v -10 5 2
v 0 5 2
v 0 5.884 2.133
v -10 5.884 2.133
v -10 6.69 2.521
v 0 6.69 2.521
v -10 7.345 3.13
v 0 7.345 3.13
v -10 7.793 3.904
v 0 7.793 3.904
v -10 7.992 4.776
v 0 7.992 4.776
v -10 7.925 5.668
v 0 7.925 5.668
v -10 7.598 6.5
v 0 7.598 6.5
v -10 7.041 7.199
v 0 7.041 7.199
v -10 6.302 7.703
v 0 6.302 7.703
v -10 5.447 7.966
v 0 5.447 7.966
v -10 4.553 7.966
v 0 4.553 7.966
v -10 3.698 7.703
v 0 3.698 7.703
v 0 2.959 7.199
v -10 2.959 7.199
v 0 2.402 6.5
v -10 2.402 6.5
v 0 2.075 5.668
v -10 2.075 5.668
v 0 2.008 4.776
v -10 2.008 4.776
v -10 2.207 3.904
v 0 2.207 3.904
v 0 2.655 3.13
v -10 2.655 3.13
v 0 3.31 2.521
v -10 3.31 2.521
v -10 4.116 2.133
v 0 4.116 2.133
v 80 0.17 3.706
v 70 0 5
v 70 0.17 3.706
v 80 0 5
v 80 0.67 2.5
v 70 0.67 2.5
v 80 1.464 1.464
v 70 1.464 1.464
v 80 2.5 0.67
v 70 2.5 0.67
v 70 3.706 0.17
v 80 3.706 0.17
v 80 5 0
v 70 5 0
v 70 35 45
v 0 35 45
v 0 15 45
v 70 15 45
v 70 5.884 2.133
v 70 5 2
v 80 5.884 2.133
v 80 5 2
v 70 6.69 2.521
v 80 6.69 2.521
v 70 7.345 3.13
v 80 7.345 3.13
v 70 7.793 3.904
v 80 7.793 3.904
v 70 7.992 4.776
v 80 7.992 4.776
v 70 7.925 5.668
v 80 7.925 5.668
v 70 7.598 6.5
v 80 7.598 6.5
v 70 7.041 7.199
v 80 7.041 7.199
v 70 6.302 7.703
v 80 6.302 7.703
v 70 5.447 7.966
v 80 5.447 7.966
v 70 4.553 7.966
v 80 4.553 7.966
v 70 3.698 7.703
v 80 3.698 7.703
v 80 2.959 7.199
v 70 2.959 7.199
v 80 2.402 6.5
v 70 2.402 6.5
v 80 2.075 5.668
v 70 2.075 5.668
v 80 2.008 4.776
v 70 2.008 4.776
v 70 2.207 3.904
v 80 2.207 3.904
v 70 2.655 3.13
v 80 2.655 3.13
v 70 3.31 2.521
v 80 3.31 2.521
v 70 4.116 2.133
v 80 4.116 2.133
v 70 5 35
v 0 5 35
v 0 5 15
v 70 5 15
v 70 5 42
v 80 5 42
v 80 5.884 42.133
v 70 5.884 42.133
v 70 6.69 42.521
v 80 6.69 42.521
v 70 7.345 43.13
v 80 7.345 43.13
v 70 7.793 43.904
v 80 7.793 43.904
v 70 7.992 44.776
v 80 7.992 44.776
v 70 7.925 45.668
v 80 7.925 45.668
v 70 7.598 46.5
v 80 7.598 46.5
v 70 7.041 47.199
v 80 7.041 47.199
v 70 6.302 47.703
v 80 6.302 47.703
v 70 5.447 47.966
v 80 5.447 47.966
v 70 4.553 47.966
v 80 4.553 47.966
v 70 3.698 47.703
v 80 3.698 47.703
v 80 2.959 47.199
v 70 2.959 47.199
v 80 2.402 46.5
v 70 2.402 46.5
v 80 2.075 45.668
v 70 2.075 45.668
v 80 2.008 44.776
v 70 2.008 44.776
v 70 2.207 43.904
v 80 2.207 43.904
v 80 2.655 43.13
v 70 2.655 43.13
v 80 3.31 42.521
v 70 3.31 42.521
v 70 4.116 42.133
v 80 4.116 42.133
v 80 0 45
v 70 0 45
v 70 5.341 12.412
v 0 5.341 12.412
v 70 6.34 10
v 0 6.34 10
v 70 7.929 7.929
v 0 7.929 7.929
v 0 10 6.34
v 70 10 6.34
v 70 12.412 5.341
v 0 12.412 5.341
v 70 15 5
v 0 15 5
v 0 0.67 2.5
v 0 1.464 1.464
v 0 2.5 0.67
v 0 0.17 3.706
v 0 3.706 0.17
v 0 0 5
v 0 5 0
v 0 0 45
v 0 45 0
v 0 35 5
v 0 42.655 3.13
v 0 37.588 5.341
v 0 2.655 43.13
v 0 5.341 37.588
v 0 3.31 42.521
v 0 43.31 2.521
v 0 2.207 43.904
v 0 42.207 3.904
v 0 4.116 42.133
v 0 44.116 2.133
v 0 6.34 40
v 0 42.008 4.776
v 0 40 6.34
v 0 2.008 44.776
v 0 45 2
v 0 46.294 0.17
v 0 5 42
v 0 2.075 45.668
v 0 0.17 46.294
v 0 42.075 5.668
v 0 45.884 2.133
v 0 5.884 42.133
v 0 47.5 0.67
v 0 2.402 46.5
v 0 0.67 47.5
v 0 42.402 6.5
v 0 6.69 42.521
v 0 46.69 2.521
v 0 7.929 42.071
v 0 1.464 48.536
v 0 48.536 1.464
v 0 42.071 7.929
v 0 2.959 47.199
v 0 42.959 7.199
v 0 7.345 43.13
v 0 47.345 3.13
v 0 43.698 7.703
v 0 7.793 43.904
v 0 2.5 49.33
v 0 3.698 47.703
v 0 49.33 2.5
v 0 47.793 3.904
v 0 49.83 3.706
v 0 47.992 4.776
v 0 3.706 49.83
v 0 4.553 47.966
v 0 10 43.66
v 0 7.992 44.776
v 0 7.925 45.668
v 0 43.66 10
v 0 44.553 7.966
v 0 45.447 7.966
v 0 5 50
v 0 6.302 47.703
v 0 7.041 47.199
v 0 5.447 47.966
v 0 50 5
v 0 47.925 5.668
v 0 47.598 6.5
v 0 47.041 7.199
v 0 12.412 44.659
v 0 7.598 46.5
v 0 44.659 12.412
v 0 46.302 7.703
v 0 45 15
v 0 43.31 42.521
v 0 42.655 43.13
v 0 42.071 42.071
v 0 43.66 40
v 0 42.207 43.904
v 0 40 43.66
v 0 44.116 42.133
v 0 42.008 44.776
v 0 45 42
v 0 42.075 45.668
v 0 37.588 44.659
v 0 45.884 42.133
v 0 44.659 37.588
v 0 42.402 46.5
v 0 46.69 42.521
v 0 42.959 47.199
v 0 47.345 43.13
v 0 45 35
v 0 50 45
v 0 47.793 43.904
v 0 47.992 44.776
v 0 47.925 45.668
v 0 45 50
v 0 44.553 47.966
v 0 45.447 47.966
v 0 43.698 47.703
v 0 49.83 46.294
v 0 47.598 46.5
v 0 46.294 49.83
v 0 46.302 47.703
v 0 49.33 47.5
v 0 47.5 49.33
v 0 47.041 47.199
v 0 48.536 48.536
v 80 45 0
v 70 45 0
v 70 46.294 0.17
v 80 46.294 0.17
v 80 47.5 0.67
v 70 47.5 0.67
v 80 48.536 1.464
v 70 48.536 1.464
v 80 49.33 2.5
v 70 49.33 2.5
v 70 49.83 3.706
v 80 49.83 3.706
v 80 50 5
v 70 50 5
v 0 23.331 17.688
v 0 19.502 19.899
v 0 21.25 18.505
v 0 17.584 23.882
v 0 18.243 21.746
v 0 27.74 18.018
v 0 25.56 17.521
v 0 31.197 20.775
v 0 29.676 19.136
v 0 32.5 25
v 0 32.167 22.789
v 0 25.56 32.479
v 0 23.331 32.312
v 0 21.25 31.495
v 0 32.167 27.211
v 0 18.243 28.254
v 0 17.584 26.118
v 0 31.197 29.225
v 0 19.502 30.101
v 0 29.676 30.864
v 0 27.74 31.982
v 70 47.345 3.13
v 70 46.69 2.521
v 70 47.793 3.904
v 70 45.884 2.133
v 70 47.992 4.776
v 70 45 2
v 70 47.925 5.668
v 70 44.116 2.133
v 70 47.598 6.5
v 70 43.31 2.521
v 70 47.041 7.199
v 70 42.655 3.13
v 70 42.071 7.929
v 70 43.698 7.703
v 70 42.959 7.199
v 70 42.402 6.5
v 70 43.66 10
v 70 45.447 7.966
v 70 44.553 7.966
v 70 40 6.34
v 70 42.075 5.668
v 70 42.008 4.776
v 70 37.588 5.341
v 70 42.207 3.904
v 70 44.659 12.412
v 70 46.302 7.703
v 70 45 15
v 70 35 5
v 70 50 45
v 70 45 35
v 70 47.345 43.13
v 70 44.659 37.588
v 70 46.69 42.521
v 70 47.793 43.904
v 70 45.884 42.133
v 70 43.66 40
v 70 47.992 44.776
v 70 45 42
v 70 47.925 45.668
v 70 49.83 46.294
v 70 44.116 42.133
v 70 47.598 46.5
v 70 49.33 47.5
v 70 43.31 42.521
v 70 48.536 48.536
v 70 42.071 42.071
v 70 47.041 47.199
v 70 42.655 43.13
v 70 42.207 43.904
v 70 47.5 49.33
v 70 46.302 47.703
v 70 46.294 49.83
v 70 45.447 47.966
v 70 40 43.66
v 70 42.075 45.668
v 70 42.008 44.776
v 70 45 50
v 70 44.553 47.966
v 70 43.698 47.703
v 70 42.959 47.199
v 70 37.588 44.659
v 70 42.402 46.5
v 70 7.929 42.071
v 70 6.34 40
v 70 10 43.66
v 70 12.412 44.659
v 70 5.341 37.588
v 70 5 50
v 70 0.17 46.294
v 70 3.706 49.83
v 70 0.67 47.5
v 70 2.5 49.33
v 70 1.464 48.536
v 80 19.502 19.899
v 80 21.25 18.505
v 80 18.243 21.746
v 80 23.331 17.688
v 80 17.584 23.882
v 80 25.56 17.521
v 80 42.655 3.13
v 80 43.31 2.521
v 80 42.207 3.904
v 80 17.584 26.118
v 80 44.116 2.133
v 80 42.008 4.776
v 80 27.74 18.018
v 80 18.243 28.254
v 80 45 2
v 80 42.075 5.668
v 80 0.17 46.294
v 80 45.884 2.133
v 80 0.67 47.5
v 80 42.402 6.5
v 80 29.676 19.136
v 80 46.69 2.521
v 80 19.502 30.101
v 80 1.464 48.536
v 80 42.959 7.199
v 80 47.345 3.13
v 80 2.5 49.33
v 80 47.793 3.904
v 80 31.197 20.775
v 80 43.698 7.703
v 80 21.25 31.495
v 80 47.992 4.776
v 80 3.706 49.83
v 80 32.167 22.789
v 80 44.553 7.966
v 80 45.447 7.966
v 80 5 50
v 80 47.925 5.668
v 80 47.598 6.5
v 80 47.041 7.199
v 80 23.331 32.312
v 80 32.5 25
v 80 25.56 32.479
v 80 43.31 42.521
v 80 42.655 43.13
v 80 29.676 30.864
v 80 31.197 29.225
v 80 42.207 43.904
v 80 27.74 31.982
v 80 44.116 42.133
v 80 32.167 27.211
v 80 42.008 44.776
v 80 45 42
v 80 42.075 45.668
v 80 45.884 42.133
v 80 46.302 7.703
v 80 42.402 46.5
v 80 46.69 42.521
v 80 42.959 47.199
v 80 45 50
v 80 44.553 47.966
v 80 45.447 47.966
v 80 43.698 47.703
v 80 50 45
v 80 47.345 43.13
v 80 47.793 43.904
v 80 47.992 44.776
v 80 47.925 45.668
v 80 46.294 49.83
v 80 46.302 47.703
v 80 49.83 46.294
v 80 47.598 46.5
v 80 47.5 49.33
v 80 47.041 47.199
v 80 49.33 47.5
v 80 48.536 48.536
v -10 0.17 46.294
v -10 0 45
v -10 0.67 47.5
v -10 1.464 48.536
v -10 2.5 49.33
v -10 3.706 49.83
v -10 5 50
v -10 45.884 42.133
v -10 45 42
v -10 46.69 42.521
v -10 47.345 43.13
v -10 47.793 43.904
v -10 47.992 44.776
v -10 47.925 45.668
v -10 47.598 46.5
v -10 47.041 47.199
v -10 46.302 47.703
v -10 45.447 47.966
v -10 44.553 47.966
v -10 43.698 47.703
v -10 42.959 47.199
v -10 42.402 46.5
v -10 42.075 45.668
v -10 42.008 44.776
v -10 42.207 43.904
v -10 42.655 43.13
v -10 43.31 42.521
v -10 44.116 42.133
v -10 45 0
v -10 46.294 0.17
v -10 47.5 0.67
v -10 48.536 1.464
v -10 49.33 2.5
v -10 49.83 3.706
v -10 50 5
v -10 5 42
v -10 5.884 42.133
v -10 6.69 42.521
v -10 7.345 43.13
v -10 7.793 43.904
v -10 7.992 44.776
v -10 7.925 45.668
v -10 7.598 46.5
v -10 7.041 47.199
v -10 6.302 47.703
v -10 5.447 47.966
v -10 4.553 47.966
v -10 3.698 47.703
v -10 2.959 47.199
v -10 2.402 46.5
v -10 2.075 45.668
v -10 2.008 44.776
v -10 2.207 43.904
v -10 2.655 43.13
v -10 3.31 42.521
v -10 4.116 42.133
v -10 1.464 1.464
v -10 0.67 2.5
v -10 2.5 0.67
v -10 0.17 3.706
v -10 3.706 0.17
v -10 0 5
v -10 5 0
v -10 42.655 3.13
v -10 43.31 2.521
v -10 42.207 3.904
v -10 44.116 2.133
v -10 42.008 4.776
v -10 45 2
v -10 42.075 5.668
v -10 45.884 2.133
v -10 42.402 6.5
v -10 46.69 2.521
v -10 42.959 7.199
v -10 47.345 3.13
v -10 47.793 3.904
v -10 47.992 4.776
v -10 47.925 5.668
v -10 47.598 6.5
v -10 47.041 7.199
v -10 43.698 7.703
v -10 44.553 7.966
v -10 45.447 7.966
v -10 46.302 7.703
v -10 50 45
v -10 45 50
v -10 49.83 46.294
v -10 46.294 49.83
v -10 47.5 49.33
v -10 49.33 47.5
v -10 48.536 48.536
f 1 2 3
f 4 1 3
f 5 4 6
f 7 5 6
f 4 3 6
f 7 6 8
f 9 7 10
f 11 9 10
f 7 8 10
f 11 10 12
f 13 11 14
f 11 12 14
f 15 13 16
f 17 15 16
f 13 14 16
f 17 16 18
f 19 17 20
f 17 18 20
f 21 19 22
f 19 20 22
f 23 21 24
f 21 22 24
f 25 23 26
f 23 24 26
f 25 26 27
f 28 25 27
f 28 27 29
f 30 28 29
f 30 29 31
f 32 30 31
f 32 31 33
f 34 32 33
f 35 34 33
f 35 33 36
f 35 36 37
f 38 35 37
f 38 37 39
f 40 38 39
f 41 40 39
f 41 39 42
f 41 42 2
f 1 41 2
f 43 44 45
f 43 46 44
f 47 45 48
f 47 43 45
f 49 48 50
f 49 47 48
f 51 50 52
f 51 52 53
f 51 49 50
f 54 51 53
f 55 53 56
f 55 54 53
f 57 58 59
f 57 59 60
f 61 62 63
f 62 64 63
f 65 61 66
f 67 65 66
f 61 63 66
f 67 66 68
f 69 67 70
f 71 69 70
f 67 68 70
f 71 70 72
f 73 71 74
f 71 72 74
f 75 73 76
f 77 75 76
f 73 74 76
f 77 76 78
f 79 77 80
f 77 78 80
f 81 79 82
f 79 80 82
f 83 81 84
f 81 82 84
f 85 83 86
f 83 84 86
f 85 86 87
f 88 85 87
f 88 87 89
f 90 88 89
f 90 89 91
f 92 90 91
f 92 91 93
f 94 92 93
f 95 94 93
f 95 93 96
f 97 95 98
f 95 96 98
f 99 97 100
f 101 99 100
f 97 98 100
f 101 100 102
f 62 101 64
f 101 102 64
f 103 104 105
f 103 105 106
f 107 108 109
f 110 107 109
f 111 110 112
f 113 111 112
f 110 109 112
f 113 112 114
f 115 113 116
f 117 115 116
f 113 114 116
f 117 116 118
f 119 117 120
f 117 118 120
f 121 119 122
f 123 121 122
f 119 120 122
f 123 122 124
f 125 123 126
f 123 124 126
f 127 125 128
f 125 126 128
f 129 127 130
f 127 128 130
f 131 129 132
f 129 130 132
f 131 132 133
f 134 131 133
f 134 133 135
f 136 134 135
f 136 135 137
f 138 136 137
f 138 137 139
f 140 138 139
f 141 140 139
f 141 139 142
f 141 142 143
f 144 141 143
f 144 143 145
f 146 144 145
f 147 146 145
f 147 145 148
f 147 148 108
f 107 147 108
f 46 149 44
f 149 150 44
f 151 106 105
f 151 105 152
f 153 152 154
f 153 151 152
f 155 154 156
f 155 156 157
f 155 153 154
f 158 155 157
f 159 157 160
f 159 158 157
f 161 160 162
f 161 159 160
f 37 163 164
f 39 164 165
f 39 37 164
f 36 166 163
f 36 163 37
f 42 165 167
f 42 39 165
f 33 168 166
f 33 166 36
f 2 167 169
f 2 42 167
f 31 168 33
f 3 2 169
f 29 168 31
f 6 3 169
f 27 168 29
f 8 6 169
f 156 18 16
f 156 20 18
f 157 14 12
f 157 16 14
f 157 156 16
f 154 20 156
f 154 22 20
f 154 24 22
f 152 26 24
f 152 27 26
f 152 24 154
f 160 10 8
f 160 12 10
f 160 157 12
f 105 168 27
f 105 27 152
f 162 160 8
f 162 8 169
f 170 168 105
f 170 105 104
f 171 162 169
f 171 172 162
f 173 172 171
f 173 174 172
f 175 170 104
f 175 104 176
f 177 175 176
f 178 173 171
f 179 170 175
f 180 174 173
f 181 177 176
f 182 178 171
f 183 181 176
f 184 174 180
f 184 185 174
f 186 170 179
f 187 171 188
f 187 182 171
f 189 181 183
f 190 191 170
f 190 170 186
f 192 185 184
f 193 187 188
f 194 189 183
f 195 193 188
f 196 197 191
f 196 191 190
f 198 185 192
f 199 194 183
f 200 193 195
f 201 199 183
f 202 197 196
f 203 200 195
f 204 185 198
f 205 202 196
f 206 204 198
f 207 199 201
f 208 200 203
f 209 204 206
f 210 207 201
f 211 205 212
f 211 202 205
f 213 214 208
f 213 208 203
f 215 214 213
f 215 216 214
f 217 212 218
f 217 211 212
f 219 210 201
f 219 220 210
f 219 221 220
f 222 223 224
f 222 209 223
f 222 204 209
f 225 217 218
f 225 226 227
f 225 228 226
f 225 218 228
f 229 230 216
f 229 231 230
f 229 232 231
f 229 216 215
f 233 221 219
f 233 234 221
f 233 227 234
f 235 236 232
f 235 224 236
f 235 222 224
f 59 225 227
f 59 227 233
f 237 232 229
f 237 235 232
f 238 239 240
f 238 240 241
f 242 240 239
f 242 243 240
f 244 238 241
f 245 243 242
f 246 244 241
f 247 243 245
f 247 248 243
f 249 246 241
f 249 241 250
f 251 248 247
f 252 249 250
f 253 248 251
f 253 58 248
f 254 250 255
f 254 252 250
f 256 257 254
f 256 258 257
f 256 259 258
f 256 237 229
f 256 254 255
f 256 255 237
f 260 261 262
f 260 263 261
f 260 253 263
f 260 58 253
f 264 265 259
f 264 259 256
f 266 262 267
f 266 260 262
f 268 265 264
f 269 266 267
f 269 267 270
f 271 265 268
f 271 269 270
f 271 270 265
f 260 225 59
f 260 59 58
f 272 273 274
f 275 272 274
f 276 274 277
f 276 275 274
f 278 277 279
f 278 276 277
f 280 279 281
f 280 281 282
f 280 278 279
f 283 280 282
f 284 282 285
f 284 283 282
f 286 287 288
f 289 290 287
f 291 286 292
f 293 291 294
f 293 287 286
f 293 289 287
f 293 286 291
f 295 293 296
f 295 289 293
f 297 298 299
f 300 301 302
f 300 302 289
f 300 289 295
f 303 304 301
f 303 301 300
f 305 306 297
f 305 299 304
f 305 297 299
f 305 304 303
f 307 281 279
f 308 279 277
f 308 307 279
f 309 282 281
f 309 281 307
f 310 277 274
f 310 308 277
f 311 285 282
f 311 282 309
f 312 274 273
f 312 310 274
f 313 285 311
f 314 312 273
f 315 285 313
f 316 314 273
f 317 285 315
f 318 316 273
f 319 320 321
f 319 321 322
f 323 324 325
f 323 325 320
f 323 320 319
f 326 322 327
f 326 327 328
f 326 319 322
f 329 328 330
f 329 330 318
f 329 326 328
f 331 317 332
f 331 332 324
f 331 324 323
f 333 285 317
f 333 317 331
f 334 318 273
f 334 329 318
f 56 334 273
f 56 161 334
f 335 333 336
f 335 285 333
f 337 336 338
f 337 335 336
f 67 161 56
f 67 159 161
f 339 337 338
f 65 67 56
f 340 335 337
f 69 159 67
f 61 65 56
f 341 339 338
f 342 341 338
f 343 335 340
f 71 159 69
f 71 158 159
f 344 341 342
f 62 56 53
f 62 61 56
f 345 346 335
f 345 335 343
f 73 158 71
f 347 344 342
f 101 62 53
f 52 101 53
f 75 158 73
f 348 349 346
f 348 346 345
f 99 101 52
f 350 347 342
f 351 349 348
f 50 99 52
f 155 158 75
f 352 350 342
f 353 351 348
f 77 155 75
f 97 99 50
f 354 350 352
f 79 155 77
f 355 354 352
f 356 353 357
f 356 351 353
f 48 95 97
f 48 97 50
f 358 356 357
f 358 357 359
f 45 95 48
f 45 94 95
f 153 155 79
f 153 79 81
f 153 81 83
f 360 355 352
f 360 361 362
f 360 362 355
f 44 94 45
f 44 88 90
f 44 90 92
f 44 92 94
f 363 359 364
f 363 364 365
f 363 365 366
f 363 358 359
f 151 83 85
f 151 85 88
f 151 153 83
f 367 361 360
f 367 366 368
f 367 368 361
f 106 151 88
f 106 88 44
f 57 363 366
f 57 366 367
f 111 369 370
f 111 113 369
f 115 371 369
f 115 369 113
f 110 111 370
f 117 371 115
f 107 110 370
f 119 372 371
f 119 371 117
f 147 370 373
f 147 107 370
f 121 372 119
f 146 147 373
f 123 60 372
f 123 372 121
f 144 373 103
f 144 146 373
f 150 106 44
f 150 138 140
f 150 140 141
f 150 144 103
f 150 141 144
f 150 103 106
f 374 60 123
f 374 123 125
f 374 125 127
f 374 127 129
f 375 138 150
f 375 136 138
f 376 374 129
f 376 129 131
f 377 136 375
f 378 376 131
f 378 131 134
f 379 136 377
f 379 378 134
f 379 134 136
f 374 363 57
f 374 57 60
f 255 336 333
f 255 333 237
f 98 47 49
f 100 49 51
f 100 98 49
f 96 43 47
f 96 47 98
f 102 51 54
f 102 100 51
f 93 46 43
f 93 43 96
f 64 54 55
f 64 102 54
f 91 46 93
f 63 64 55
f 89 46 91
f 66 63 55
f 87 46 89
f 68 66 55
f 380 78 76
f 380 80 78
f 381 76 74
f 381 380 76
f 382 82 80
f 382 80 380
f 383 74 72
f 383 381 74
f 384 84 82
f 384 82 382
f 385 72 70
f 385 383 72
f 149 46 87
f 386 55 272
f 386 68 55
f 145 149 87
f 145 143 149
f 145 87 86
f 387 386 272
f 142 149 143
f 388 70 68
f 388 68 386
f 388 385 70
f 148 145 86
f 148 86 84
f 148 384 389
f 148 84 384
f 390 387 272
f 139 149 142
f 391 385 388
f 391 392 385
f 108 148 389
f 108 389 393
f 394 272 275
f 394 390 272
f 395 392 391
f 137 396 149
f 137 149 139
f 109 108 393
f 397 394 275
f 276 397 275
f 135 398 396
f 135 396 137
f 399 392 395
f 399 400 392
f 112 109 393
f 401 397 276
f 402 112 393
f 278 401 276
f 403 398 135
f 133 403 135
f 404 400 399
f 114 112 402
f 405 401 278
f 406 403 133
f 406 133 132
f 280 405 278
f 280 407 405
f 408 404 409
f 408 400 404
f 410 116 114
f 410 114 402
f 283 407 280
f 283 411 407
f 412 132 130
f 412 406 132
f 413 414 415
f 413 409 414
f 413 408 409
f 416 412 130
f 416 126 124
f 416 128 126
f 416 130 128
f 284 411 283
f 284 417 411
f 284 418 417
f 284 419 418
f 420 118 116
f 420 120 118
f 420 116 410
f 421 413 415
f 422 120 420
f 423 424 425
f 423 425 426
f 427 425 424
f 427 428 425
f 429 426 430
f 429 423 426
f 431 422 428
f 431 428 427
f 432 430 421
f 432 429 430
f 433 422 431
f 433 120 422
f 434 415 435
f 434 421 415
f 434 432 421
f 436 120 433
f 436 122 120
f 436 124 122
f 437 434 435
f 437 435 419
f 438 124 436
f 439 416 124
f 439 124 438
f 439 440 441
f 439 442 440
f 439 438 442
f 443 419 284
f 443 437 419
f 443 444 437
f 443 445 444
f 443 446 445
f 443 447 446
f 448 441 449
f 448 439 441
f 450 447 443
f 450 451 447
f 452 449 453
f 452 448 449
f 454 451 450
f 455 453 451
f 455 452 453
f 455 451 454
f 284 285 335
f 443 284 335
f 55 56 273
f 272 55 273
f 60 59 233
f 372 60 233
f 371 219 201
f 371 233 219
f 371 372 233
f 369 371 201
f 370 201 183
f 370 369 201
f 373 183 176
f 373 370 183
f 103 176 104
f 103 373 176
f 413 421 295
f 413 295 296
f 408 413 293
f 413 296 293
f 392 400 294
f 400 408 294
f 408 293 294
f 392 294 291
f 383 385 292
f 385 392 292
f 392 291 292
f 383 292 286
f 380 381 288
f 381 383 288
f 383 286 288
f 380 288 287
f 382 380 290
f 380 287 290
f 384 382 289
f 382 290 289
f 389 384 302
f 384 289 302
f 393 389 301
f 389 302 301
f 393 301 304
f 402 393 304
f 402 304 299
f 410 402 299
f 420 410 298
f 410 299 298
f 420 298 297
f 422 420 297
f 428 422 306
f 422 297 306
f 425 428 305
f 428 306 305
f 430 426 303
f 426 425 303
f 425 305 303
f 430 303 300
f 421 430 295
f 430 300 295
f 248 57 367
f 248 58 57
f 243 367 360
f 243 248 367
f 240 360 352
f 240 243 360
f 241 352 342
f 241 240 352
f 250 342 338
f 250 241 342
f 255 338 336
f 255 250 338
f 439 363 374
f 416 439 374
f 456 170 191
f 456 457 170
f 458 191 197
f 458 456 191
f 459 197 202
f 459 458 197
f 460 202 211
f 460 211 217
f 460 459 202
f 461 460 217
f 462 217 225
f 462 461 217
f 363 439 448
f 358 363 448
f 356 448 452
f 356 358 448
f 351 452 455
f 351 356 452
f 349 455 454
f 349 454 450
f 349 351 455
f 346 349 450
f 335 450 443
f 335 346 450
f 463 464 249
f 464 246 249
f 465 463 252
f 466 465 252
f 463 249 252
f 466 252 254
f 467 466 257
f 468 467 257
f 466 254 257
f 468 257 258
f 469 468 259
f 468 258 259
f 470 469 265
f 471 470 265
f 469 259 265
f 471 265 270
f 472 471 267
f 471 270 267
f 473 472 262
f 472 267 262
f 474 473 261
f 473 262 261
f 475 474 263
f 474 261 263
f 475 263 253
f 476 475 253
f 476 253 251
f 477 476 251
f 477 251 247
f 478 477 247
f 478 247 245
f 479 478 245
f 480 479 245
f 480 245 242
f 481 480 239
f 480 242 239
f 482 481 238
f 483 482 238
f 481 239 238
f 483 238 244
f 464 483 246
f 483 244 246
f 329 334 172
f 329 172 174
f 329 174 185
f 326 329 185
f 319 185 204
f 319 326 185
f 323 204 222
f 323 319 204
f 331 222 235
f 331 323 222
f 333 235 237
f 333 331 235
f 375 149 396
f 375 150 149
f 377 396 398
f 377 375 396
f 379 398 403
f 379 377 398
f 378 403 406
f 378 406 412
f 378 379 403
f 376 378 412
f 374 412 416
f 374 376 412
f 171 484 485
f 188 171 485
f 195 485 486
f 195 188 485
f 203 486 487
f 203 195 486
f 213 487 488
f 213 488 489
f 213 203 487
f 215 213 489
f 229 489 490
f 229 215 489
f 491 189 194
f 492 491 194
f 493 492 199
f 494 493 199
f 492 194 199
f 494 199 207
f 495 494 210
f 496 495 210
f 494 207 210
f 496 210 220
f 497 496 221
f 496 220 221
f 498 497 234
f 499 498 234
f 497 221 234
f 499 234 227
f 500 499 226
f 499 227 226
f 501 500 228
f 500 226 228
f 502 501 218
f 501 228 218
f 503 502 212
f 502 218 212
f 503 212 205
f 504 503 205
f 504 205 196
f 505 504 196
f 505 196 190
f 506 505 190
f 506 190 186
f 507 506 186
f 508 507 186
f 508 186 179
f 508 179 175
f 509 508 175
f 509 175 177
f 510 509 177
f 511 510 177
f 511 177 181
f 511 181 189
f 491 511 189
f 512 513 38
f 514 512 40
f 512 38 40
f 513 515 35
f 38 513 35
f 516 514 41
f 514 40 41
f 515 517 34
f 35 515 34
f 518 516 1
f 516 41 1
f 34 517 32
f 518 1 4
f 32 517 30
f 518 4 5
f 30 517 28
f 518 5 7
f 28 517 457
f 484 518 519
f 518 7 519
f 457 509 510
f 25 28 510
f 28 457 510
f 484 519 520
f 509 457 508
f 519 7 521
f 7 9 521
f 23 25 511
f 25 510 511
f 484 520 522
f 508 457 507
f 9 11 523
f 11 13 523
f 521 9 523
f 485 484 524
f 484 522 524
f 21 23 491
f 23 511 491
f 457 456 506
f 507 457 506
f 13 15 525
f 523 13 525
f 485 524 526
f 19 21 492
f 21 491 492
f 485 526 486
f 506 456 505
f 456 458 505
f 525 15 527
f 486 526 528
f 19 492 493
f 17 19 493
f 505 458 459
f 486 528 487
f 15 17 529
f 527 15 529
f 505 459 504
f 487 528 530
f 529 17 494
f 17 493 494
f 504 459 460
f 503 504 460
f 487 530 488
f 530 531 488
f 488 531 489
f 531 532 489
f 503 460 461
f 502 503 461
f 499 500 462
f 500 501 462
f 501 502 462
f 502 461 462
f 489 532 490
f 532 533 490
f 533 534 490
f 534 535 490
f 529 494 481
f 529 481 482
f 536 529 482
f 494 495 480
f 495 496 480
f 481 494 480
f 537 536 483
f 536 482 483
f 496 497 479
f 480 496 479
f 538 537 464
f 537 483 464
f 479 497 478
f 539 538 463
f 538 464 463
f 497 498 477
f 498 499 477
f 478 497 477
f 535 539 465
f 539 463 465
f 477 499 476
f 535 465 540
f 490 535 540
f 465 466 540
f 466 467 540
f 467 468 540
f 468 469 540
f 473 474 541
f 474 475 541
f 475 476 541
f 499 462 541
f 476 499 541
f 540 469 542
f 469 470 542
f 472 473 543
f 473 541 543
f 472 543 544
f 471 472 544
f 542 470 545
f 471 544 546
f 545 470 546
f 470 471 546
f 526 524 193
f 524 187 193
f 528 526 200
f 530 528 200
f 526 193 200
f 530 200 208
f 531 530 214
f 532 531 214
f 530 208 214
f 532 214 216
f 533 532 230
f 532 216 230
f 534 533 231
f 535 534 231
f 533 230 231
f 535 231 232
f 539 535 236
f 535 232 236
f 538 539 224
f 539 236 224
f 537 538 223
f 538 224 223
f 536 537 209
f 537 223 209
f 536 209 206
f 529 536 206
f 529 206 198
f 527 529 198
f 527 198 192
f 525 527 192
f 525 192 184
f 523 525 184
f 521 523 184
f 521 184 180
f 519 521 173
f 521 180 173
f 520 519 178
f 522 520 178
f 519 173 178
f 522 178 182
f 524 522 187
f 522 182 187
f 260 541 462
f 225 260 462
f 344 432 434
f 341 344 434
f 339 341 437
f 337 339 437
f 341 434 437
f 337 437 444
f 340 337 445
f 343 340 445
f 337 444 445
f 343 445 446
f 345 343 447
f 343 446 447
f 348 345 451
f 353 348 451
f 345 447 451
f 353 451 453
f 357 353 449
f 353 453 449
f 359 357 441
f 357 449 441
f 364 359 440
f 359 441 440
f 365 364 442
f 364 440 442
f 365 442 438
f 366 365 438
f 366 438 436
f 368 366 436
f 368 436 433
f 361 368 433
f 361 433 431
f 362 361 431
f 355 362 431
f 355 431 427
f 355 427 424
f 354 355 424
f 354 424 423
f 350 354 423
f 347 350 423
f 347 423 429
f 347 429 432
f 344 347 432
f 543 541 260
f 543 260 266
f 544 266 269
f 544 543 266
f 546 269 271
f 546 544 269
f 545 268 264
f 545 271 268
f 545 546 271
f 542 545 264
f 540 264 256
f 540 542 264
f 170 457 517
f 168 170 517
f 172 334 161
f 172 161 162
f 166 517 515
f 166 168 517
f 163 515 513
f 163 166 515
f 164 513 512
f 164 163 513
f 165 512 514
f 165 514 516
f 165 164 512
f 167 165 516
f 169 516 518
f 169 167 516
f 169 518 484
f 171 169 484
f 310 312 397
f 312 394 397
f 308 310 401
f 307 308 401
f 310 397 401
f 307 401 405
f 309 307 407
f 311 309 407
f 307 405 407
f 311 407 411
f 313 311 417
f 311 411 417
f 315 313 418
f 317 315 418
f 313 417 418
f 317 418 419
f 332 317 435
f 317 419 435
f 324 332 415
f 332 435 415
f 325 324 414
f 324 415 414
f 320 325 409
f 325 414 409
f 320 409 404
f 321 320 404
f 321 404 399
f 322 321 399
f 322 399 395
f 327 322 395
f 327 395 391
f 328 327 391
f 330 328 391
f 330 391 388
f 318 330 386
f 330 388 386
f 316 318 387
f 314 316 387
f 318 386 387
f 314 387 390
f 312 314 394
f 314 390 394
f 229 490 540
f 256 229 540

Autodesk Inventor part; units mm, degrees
ref_plane "YZ Plane" through (0, 0, 0) normal (1, 0, 0) x (0, 1, 0)
ref_plane "XZ Plane" through (0, 0, 0) normal (0, 1, 0) x (-1, 0, 0)
ref_plane "XY Plane" through (0, 0, 0) normal (0, 0, 1) x (1, 0, 0)
sketch "Sketch1" plane through (0, 0, 0) normal (1, 0, 0) x (0, 1, 0)
  line L0 (0, 0) -> (50, 0)
  line L1 (50, 0) -> (50, 50)
  line L2 (50, 50) -> (0, 50)
  line L3 (0, 50) -> (0, 0)
  circle A0 centre (25, 25) radius 7.5
  dimension "d0" = 50
  dimension "d1" = 50
  dimension "d2" = 15
extrude "Extrusion1" add sketch "Sketch1" along normal blind 80
extrude "Extrusion2" add sketch "Sketch1" against normal blind 10 contours L3 L2 L1 L0 | A0
sketch "Sketch2" plane through (80, 0, 50) normal (0, 0, 1) x (1, 0, 0)
  line L0 (0, 50) -> (-90, 50) projected
  line L1 (-90, 0) -> (0, 0) projected
  line L2 (-80, 50) -> (-10, 50)
  line L3 (-10, 50) -> (-10, 0)
  line L4 (-10, 0) -> (-80, 0)
  line L5 (-80, 0) -> (-80, 50)
  line L6 (-80, 50) -> (-10, 50)
  line L7 (-10, 50) -> (-10, 45)
  line L8 (-10, 45) -> (-80, 45)
  line L9 (-80, 45) -> (-80, 50)
  line L10 (-10, 0) -> (-80, 0)
  line L11 (-80, 0) -> (-80, 5)
  line L12 (-80, 5) -> (-10, 5)
  line L13 (-10, 5) -> (-10, 0)
  point P0 (-10, 45)
  dimension "d7" = 70
  dimension "d8" = 70
  dimension "d9" = 5
  dimension "d10" = 70
  dimension "d11" = 5
extrude "Extrusion3" cut sketch "Sketch2" against normal blind 50 contours L3 L8 L5 L0 | L3 L1 L5 L12
extrude "Extrusion4" cut sketch "Sketch2" against normal blind 5 contours L3 L12 L5 L8
sketch "Sketch3" plane through (80, 0, 0) normal (0, 0, -1) x (-1, 0, 0)
  line L0 (80, 45) -> (10, 45) projected
  line L1 (80, 5) -> (80, 0) projected
  line L2 (10, 45) -> (80, 45)
  line L3 (80, 45) -> (80, 5)
  line L4 (80, 5) -> (10, 5)
  line L5 (10, 5) -> (10, 45)
extrude "Extrusion5" cut sketch "Sketch3" against normal blind 5
fillet "Fillet2" radius 5 8 edges at (-5, 50, 50) (75, 50, 50) (75, 50, 0) (-5, 50, 0) (-5, 0, 0) (75, 0, 0) (-5, 0, 50) (75, 0, 50)
fillet "Fillet3" radius 10 4 edges at (35, 45, 45) (35, 5, 45) (35, 45, 5) (35, 5, 5)
sketch "Sketch5" plane through (80, 0, 0) normal (1, 0, 0) x (0, 0, -1)
  arc A0 (-45, 50) -> (-50, 45) centre (-45, 45) ccw projected
  circle A1 centre (-45, 45) radius 3
  arc A2 (0, 45) -> (-5, 50) centre (-5, 45) ccw projected
  circle A3 centre (-5, 45) radius 3
  arc A4 (-5, 0) -> (0, 5) centre (-5, 5) ccw projected
  circle A5 centre (-5, 5) radius 3
  arc A6 (-50, 5) -> (-45, 0) centre (-45, 5) ccw projected
  circle A7 centre (-45, 5) radius 3
  point P0 (0, 0)
  dimension "d25" = 6
  dimension "d26" = 6
  dimension "d27" = 6
  dimension "d28" = 6
extrude "Extrusion6" cut sketch "Sketch5" against normal blind 90
properties part number "Contenedor"
